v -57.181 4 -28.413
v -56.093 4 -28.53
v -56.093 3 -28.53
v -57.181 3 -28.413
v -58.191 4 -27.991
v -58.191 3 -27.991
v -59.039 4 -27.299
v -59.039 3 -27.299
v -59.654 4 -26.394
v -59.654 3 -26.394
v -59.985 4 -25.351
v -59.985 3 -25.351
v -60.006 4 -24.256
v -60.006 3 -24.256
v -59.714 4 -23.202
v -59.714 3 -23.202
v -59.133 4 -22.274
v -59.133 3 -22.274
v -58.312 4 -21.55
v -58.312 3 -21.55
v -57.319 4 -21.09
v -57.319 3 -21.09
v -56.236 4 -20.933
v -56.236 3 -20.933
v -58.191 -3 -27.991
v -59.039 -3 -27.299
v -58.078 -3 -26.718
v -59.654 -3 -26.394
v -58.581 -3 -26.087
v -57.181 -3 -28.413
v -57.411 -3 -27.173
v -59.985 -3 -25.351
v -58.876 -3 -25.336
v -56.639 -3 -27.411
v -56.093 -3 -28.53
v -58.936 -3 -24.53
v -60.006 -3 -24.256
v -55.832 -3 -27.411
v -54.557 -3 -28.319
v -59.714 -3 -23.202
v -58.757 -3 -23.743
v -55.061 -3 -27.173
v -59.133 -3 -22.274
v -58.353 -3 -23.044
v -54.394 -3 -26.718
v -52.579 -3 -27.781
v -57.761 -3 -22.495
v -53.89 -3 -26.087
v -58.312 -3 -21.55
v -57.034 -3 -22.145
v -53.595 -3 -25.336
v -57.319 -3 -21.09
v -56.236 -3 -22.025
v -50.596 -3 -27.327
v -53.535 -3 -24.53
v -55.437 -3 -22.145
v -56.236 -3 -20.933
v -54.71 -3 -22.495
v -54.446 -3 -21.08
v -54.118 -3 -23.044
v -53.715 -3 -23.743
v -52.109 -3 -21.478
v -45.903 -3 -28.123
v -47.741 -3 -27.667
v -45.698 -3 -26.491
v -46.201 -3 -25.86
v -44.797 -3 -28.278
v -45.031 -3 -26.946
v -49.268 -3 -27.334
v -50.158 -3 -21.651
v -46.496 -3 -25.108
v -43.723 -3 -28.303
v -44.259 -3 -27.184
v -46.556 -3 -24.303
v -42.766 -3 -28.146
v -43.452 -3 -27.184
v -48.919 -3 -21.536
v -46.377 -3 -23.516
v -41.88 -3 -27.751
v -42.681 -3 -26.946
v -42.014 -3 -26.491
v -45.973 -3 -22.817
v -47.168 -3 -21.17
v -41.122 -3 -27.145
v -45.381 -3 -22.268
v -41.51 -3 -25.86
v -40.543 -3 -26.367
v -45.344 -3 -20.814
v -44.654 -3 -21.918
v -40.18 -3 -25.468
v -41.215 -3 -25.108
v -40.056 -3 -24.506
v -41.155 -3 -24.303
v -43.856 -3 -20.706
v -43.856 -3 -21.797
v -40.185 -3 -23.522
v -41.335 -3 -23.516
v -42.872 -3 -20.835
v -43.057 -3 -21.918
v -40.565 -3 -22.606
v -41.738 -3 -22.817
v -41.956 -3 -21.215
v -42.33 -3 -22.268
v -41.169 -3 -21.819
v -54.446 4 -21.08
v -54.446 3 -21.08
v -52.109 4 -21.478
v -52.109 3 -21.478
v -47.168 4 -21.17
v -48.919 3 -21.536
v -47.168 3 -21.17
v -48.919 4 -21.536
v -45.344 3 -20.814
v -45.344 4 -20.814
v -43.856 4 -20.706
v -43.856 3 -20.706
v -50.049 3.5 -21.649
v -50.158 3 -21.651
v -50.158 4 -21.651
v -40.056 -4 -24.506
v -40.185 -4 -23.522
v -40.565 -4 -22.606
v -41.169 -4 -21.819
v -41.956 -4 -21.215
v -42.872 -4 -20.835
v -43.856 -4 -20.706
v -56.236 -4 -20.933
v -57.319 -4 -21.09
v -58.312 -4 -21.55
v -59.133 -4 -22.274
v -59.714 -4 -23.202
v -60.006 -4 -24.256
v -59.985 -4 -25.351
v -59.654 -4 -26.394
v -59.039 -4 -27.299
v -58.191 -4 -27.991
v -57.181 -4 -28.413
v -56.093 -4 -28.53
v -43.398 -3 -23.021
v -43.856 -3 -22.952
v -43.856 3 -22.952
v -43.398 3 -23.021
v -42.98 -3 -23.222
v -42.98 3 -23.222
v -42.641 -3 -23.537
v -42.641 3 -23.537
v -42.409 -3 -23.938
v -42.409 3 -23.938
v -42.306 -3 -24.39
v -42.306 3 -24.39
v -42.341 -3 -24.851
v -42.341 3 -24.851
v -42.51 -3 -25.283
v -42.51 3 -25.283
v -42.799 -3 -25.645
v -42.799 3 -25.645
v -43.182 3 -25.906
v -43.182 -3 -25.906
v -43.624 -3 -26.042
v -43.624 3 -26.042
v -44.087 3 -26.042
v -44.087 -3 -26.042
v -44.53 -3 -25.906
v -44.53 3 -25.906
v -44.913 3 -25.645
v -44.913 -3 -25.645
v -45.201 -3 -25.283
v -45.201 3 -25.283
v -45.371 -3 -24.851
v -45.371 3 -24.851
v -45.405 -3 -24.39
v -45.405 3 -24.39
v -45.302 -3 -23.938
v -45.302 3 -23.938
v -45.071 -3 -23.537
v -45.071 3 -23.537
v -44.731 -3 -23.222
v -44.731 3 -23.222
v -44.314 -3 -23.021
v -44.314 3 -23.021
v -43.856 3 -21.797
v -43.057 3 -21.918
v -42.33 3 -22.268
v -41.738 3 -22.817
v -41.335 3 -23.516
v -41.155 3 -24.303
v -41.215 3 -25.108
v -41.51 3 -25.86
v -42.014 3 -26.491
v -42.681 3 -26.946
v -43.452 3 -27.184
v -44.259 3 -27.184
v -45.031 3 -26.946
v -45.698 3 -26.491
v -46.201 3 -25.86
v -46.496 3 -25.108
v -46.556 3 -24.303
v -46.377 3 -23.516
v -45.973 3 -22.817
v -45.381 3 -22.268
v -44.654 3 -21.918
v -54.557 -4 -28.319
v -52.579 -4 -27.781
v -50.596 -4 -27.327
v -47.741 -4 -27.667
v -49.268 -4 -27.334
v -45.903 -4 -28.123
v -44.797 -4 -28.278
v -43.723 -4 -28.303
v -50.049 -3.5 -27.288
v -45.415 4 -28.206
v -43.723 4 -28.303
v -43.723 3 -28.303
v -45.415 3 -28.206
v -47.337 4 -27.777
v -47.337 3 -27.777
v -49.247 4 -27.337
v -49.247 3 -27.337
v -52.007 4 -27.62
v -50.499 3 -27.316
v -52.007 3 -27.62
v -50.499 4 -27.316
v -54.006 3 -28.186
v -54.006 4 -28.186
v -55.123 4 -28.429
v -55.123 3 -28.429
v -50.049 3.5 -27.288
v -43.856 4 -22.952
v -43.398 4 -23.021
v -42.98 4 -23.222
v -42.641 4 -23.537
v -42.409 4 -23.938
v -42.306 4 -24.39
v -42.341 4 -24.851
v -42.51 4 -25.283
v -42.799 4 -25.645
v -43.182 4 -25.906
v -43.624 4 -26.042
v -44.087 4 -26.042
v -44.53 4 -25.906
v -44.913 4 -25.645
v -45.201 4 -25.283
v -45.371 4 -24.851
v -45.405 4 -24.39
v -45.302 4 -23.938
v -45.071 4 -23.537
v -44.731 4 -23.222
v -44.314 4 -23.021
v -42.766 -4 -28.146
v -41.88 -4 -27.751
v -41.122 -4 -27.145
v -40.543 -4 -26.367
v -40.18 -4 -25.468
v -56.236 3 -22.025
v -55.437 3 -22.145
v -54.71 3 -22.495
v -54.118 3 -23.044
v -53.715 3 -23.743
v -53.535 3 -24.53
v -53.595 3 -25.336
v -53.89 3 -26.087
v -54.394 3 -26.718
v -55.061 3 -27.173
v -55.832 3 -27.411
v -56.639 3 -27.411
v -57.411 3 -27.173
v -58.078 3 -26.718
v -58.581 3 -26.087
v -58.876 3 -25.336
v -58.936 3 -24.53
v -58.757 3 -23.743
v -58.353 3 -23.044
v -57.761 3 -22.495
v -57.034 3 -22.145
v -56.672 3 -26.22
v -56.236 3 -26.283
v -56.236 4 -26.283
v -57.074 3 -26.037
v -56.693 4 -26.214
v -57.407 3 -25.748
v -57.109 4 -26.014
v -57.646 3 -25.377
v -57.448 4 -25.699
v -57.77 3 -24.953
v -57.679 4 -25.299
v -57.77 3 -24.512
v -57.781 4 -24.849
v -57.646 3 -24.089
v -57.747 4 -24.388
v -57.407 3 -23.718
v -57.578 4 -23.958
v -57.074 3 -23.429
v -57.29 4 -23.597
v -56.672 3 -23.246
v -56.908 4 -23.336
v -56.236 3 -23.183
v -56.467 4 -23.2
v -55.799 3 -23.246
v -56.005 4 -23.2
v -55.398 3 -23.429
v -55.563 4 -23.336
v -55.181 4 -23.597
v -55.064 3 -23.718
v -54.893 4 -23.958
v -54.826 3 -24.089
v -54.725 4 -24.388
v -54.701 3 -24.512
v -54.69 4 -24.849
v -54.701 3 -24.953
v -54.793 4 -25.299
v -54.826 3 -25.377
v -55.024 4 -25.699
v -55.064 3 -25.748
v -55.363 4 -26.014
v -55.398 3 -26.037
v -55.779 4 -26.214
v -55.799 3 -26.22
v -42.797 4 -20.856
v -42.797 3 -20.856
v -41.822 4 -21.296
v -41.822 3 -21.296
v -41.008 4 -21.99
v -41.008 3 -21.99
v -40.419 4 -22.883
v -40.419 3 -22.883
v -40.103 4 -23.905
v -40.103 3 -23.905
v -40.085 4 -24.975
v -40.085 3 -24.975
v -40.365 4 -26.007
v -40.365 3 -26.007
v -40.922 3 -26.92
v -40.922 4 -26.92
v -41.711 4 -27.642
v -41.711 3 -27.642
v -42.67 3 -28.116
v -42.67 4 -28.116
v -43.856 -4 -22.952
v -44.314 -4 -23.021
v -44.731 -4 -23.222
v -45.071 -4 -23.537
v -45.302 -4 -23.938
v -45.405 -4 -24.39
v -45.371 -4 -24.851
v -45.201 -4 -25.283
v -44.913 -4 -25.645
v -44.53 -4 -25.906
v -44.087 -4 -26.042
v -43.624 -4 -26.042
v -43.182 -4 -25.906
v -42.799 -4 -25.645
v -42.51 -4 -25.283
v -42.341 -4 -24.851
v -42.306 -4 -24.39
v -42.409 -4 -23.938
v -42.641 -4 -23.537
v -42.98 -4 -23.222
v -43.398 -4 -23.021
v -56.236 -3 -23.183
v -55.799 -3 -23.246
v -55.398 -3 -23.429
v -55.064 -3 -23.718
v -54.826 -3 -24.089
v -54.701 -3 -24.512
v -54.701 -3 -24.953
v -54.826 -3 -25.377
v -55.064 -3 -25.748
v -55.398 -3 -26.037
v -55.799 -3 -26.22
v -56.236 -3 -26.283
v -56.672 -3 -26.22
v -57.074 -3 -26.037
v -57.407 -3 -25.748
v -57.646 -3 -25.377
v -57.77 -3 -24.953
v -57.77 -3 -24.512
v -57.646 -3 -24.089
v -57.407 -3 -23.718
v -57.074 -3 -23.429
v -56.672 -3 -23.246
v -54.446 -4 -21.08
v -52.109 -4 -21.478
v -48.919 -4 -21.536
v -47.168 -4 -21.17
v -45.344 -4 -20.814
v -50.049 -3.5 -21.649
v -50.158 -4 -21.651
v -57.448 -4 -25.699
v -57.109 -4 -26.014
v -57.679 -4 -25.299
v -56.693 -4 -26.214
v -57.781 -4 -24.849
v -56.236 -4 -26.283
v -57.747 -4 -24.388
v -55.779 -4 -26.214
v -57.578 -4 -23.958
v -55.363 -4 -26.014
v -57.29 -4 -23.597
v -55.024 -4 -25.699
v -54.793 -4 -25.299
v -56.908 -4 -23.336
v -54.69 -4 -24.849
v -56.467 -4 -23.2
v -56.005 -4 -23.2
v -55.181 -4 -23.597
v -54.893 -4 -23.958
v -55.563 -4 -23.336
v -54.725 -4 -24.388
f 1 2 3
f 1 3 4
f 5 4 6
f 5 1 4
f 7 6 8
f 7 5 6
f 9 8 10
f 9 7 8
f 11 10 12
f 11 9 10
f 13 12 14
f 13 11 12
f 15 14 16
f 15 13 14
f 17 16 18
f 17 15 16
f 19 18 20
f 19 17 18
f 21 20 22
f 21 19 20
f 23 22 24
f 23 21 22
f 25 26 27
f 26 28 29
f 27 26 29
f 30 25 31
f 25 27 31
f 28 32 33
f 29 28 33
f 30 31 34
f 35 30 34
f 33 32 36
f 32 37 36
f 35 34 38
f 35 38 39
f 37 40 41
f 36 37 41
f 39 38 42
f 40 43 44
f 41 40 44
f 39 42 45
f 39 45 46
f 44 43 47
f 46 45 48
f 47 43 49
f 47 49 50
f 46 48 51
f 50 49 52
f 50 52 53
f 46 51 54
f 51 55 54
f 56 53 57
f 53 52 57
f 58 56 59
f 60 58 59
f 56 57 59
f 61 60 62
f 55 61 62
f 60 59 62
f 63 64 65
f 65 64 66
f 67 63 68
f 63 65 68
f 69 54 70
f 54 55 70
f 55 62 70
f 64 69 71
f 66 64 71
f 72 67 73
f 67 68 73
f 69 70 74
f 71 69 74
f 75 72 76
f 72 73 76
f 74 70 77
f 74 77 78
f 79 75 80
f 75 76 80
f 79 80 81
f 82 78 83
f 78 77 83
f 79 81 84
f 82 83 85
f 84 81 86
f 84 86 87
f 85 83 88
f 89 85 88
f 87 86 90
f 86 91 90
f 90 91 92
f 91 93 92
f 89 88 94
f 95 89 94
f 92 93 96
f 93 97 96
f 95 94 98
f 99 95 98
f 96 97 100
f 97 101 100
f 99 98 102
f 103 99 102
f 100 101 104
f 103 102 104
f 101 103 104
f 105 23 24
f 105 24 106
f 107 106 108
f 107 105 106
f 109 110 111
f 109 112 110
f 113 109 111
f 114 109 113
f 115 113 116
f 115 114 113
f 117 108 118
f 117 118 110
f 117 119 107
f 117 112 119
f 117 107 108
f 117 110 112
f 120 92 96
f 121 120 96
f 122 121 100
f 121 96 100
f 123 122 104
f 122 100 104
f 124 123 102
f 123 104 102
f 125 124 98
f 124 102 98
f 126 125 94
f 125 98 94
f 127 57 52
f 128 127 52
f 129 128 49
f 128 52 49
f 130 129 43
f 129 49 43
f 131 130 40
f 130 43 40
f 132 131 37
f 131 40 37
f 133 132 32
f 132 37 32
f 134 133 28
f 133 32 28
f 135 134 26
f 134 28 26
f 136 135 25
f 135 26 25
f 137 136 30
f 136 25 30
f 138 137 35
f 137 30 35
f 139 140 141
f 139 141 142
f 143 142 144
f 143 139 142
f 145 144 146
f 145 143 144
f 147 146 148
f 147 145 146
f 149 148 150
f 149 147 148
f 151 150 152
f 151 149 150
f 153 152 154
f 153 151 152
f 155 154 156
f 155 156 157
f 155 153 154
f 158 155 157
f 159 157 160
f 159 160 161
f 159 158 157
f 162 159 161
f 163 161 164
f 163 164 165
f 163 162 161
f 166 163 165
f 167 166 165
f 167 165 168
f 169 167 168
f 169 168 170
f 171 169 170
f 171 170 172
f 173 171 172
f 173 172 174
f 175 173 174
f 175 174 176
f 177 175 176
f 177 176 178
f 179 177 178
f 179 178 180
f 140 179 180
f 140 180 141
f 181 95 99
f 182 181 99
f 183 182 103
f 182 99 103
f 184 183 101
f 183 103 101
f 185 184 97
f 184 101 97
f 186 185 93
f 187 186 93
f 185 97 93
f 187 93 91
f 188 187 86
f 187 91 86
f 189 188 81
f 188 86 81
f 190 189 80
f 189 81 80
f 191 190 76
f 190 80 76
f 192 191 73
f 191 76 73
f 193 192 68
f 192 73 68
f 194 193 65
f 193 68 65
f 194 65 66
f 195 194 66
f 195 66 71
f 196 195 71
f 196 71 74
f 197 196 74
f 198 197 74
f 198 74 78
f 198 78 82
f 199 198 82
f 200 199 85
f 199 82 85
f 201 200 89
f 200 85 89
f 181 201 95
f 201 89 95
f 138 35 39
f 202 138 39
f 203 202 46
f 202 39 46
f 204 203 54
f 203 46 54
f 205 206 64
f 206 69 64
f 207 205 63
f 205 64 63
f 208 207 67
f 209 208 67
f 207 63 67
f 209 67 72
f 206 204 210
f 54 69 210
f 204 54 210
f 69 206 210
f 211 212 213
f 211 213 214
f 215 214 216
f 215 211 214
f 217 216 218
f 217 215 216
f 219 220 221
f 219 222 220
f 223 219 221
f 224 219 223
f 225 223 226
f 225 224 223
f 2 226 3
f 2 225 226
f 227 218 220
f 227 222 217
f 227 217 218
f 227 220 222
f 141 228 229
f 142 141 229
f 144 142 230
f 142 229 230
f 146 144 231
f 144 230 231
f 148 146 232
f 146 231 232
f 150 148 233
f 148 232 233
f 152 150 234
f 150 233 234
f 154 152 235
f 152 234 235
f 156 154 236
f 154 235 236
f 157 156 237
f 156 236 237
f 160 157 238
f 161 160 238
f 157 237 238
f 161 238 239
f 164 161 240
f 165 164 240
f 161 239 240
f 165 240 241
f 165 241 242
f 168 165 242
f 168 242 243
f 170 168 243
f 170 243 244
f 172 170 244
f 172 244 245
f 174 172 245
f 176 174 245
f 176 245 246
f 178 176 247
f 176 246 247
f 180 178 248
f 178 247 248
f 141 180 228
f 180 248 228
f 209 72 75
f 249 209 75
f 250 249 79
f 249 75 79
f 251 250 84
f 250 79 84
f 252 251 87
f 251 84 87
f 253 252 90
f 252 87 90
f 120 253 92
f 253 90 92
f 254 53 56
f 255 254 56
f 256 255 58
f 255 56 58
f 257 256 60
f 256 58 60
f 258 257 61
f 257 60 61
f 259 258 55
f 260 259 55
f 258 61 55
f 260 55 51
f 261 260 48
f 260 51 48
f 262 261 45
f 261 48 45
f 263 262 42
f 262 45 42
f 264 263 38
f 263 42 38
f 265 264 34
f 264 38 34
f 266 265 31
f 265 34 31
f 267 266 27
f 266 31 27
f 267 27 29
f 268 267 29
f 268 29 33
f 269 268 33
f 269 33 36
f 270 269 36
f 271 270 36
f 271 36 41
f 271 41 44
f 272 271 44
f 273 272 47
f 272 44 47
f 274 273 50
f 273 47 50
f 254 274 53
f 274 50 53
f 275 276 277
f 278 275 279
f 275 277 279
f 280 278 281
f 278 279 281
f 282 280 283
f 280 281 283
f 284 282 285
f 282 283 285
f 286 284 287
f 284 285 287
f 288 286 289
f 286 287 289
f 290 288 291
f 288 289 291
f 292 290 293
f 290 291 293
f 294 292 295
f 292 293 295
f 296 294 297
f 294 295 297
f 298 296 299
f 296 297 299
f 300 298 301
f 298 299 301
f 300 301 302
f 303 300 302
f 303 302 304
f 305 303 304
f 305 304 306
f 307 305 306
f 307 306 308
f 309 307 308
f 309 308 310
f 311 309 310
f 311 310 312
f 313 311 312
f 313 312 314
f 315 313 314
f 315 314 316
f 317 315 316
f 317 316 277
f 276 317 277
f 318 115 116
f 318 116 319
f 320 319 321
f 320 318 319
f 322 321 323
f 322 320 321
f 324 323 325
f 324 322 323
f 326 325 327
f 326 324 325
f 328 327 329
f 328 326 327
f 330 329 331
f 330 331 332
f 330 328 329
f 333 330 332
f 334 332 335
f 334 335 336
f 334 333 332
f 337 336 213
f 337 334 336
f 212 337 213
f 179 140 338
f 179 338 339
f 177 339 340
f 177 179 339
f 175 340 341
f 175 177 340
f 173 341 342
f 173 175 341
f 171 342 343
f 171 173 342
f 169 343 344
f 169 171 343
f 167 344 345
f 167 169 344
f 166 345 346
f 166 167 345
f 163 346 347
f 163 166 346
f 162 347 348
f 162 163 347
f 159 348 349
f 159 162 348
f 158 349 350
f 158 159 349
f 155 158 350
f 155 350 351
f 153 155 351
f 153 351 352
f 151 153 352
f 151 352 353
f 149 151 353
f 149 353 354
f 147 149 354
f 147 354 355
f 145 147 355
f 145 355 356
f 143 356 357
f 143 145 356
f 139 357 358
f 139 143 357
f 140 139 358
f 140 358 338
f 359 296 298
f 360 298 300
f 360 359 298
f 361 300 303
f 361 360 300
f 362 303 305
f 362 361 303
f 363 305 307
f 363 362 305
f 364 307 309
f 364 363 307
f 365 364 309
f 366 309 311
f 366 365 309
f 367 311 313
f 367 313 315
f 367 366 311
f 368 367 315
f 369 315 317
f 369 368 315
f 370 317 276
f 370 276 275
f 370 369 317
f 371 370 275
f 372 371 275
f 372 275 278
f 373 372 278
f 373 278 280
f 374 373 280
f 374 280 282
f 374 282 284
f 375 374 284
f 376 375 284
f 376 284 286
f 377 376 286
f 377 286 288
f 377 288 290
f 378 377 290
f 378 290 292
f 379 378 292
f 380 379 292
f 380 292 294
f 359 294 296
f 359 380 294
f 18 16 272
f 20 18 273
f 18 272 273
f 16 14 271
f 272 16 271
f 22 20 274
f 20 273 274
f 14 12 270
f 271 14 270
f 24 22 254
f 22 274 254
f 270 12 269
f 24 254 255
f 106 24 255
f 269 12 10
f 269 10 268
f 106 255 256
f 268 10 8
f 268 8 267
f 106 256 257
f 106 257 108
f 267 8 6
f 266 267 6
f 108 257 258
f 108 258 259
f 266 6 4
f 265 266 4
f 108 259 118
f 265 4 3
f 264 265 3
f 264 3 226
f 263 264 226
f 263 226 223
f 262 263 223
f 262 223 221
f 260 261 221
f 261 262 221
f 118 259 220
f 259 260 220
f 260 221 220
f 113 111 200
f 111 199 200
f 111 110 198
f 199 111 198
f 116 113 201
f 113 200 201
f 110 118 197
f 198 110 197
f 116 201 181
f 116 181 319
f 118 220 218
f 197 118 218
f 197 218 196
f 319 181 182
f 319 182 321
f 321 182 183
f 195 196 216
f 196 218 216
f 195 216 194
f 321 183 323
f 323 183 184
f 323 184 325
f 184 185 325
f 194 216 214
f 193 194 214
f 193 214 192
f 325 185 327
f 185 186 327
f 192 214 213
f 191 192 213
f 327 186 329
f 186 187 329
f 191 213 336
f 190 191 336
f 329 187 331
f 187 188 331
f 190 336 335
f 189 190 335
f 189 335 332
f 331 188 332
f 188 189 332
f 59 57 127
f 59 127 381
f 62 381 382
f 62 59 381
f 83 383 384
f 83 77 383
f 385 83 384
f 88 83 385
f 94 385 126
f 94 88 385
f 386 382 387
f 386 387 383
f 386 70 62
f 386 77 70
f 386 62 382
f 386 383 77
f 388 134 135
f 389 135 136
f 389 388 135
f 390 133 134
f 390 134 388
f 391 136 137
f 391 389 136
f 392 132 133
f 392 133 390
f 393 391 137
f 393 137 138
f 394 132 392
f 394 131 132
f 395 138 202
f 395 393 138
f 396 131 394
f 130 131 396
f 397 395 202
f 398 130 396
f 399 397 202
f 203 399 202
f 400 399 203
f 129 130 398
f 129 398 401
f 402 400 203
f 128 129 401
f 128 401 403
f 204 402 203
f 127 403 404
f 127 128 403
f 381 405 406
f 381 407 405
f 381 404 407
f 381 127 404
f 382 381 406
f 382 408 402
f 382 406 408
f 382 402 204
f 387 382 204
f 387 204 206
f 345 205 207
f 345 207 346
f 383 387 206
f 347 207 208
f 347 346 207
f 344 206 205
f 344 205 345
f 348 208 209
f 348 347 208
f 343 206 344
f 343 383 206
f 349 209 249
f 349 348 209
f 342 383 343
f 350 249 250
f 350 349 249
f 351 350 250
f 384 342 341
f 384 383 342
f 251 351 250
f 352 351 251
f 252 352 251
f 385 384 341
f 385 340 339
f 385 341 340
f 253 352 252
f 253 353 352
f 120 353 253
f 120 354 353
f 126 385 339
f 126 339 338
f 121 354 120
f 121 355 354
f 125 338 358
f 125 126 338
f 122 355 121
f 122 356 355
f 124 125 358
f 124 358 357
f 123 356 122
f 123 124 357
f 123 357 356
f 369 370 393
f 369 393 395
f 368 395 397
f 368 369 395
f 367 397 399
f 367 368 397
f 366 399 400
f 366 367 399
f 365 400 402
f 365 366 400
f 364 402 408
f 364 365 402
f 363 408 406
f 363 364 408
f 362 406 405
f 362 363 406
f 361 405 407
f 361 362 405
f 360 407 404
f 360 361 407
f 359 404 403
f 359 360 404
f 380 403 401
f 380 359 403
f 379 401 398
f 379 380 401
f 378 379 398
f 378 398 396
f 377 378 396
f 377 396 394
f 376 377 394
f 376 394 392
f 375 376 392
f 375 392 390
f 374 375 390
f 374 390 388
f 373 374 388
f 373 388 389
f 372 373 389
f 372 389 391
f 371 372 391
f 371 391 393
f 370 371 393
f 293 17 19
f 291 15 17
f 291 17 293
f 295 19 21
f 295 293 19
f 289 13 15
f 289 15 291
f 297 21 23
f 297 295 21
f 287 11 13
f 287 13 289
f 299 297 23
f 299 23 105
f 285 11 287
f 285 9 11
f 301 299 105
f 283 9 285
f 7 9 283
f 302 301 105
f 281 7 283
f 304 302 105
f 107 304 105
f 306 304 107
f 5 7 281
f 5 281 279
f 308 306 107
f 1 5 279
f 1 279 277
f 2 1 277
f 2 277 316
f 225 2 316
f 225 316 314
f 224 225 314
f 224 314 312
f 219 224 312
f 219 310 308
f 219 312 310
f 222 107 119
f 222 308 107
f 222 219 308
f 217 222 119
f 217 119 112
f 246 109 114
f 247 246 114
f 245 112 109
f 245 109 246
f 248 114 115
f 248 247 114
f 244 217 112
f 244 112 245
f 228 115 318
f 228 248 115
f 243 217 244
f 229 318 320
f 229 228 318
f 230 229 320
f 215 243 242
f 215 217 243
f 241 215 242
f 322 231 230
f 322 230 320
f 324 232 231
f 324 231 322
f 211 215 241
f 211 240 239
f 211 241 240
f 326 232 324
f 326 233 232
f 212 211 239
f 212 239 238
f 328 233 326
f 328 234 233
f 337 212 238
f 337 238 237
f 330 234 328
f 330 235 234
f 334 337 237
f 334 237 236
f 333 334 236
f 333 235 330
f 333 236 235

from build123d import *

# Parameters (mm, degrees)
EXTRUDE_8_DEPTH          = 3
EXTRUDE_8_DEPTH_BACK     = 3
SKETCH_3_R               = 2.708293856
EXTRUDE_8_2_DEPTH        = 3
EXTRUDE_8_2_DEPTH_BACK   = 3
CUT_EXTRUDE_1_DEPTH      = 3
CUT_EXTRUDE_1_DEPTH_BACK = 6
SKETCH_4_R               = 1.55
SKETCH_4_R_2             = 1.553894019
SKETCH_7_R               = 1.553894019
SKETCH_7_R_2             = 1.55
EXTRUDE_9_DEPTH          = 1
EXTRUDE_START            = 1
SKETCH_18_R              = 1.55
SKETCH_18_R_2            = 1.553894019
EXTRUDE_17_DEPTH         = 1


with BuildPart() as part:
    # 草图3 → 凸台-拉伸8 (new, two sides: drawn at the far end of the back side and taken through both)
    with BuildSketch(Plane(origin=(0, 0, 0), x_dir=(1, 0, 0), z_dir=(0, 1, 0)).offset(-EXTRUDE_8_DEPTH_BACK)):
        with Locations((-56.235722287, 24.732868077)):
            Circle(SKETCH_3_R)
    extrude(amount=EXTRUDE_8_DEPTH + EXTRUDE_8_DEPTH_BACK)


with BuildPart() as body_2:
    # 草图3 → Extrude 8 2 (new, two sides: drawn at the far end of the back side and taken through both)
    with BuildSketch(Plane(origin=(0, 0, 0), x_dir=(1, 0, 0), z_dir=(0, 1, 0)).offset(-EXTRUDE_8_2_DEPTH_BACK)):
        with Locations((-43.855722287, 24.505707547)):
            Circle(SKETCH_3_R)
    extrude(amount=EXTRUDE_8_2_DEPTH + EXTRUDE_8_2_DEPTH_BACK)


with BuildPart() as cut_extrude_1_tool:
    # 草图4 → 切除-拉伸1 (new, two sides: drawn at the far end of the back side and taken through both)
    with BuildSketch(Plane(origin=(0, 0, 0), x_dir=(1, 0, 0), z_dir=(0, 1, 0)).offset(-CUT_EXTRUDE_1_DEPTH_BACK)):
        with Locations((-56.235722287, 24.732868077)):
            Circle(SKETCH_4_R)
        with Locations((-43.855722287, 24.505707547)):
            Circle(SKETCH_4_R_2)
    extrude(amount=CUT_EXTRUDE_1_DEPTH + CUT_EXTRUDE_1_DEPTH_BACK)


with BuildPart() as part_1:
    add(part.part)

    # 切除-拉伸1: cut by cut_extrude_1_tool
    add(cut_extrude_1_tool.part, mode=Mode.SUBTRACT)



with BuildPart() as body_2_1:
    add(body_2.part)

    # 切除-拉伸1: cut by cut_extrude_1_tool
    add(cut_extrude_1_tool.part, mode=Mode.SUBTRACT)


with BuildPart() as part_2:
    add(part_1.part)

    add(body_2_1.part)  # 凸台-拉伸9 merges body 2
    # 草图7 → 凸台-拉伸9 (add)
    with BuildSketch(Plane.XZ.offset(3)):
        with BuildLine():
            ThreePointArc((-56.235722287, -20.932868077), (-60.035052689, -24.804201821), (-56.093079937, -28.530189917))
            add(Edge.make_bspline(
                [(-56.093079937, -28.530189917), (-53.942583983, -28.449408827), (-49.768599584, -26.149491118), (-46.433977381, -28.398120151), (-43.723017894, -28.303389675)],
                knots=[0, 0, 0, 0, 0.490575379, 1, 1, 1, 1], degree=3))
            ThreePointArc((-43.723017894, -28.303389675), (-40.0563018, -24.43934523), (-43.855722287, -20.705707547))
            add(Edge.make_bspline(
                [(-56.235722287, -20.932868077), (-54.105831048, -20.932868077), (-49.896032342, -22.477788173), (-46.252423284, -20.705707547), (-43.855722287, -20.705707547)],
                knots=[0, 0, 0, 0, 0.498510271, 1, 1, 1, 1], degree=3))
        make_face()
        with Locations((-43.855722287, -24.505707547)):
            Circle(SKETCH_7_R, mode=Mode.SUBTRACT)
        with Locations((-56.235722287, -24.732868077)):
            Circle(SKETCH_7_R_2, mode=Mode.SUBTRACT)
    extrude(amount=EXTRUDE_9_DEPTH)

    # 草图18 → 凸台-拉伸17 (add)
    with BuildSketch(Plane(origin=(0, 3, 0), x_dir=(1, 0, 0), z_dir=(0, 1, 0)).offset(EXTRUDE_START)):
        with BuildLine():
            ThreePointArc((-56.093079937, 28.530189917), (-60.035052689, 24.804201821), (-56.235722287, 20.932868077))
            add(Edge.make_bspline(
                [(-56.235722287, 20.932868077), (-54.105831048, 20.932868077), (-49.896032342, 22.477788173), (-46.252423284, 20.705707547), (-43.855722287, 20.705707547)],
                knots=[0, 0, 0, 0, 0.498510271, 1, 1, 1, 1], degree=3))
            ThreePointArc((-43.855722287, 20.705707547), (-40.0563018, 24.43934523), (-43.723017894, 28.303389675))
            add(Edge.make_bspline(
                [(-43.723017894, 28.303389675), (-46.433977381, 28.398120151), (-49.768599584, 26.149491118), (-53.942583983, 28.449408827), (-56.093079937, 28.530189917)],
                knots=[0, 0, 0, 0, 0.509424621, 1, 1, 1, 1], degree=3))
        make_face()
        with Locations((-56.235722287, 24.732868077)):
            Circle(SKETCH_18_R, mode=Mode.SUBTRACT)
        with Locations((-43.855722287, 24.505707547)):
            Circle(SKETCH_18_R_2, mode=Mode.SUBTRACT)
    extrude(amount=-EXTRUDE_17_DEPTH)


solid = part_2.part
